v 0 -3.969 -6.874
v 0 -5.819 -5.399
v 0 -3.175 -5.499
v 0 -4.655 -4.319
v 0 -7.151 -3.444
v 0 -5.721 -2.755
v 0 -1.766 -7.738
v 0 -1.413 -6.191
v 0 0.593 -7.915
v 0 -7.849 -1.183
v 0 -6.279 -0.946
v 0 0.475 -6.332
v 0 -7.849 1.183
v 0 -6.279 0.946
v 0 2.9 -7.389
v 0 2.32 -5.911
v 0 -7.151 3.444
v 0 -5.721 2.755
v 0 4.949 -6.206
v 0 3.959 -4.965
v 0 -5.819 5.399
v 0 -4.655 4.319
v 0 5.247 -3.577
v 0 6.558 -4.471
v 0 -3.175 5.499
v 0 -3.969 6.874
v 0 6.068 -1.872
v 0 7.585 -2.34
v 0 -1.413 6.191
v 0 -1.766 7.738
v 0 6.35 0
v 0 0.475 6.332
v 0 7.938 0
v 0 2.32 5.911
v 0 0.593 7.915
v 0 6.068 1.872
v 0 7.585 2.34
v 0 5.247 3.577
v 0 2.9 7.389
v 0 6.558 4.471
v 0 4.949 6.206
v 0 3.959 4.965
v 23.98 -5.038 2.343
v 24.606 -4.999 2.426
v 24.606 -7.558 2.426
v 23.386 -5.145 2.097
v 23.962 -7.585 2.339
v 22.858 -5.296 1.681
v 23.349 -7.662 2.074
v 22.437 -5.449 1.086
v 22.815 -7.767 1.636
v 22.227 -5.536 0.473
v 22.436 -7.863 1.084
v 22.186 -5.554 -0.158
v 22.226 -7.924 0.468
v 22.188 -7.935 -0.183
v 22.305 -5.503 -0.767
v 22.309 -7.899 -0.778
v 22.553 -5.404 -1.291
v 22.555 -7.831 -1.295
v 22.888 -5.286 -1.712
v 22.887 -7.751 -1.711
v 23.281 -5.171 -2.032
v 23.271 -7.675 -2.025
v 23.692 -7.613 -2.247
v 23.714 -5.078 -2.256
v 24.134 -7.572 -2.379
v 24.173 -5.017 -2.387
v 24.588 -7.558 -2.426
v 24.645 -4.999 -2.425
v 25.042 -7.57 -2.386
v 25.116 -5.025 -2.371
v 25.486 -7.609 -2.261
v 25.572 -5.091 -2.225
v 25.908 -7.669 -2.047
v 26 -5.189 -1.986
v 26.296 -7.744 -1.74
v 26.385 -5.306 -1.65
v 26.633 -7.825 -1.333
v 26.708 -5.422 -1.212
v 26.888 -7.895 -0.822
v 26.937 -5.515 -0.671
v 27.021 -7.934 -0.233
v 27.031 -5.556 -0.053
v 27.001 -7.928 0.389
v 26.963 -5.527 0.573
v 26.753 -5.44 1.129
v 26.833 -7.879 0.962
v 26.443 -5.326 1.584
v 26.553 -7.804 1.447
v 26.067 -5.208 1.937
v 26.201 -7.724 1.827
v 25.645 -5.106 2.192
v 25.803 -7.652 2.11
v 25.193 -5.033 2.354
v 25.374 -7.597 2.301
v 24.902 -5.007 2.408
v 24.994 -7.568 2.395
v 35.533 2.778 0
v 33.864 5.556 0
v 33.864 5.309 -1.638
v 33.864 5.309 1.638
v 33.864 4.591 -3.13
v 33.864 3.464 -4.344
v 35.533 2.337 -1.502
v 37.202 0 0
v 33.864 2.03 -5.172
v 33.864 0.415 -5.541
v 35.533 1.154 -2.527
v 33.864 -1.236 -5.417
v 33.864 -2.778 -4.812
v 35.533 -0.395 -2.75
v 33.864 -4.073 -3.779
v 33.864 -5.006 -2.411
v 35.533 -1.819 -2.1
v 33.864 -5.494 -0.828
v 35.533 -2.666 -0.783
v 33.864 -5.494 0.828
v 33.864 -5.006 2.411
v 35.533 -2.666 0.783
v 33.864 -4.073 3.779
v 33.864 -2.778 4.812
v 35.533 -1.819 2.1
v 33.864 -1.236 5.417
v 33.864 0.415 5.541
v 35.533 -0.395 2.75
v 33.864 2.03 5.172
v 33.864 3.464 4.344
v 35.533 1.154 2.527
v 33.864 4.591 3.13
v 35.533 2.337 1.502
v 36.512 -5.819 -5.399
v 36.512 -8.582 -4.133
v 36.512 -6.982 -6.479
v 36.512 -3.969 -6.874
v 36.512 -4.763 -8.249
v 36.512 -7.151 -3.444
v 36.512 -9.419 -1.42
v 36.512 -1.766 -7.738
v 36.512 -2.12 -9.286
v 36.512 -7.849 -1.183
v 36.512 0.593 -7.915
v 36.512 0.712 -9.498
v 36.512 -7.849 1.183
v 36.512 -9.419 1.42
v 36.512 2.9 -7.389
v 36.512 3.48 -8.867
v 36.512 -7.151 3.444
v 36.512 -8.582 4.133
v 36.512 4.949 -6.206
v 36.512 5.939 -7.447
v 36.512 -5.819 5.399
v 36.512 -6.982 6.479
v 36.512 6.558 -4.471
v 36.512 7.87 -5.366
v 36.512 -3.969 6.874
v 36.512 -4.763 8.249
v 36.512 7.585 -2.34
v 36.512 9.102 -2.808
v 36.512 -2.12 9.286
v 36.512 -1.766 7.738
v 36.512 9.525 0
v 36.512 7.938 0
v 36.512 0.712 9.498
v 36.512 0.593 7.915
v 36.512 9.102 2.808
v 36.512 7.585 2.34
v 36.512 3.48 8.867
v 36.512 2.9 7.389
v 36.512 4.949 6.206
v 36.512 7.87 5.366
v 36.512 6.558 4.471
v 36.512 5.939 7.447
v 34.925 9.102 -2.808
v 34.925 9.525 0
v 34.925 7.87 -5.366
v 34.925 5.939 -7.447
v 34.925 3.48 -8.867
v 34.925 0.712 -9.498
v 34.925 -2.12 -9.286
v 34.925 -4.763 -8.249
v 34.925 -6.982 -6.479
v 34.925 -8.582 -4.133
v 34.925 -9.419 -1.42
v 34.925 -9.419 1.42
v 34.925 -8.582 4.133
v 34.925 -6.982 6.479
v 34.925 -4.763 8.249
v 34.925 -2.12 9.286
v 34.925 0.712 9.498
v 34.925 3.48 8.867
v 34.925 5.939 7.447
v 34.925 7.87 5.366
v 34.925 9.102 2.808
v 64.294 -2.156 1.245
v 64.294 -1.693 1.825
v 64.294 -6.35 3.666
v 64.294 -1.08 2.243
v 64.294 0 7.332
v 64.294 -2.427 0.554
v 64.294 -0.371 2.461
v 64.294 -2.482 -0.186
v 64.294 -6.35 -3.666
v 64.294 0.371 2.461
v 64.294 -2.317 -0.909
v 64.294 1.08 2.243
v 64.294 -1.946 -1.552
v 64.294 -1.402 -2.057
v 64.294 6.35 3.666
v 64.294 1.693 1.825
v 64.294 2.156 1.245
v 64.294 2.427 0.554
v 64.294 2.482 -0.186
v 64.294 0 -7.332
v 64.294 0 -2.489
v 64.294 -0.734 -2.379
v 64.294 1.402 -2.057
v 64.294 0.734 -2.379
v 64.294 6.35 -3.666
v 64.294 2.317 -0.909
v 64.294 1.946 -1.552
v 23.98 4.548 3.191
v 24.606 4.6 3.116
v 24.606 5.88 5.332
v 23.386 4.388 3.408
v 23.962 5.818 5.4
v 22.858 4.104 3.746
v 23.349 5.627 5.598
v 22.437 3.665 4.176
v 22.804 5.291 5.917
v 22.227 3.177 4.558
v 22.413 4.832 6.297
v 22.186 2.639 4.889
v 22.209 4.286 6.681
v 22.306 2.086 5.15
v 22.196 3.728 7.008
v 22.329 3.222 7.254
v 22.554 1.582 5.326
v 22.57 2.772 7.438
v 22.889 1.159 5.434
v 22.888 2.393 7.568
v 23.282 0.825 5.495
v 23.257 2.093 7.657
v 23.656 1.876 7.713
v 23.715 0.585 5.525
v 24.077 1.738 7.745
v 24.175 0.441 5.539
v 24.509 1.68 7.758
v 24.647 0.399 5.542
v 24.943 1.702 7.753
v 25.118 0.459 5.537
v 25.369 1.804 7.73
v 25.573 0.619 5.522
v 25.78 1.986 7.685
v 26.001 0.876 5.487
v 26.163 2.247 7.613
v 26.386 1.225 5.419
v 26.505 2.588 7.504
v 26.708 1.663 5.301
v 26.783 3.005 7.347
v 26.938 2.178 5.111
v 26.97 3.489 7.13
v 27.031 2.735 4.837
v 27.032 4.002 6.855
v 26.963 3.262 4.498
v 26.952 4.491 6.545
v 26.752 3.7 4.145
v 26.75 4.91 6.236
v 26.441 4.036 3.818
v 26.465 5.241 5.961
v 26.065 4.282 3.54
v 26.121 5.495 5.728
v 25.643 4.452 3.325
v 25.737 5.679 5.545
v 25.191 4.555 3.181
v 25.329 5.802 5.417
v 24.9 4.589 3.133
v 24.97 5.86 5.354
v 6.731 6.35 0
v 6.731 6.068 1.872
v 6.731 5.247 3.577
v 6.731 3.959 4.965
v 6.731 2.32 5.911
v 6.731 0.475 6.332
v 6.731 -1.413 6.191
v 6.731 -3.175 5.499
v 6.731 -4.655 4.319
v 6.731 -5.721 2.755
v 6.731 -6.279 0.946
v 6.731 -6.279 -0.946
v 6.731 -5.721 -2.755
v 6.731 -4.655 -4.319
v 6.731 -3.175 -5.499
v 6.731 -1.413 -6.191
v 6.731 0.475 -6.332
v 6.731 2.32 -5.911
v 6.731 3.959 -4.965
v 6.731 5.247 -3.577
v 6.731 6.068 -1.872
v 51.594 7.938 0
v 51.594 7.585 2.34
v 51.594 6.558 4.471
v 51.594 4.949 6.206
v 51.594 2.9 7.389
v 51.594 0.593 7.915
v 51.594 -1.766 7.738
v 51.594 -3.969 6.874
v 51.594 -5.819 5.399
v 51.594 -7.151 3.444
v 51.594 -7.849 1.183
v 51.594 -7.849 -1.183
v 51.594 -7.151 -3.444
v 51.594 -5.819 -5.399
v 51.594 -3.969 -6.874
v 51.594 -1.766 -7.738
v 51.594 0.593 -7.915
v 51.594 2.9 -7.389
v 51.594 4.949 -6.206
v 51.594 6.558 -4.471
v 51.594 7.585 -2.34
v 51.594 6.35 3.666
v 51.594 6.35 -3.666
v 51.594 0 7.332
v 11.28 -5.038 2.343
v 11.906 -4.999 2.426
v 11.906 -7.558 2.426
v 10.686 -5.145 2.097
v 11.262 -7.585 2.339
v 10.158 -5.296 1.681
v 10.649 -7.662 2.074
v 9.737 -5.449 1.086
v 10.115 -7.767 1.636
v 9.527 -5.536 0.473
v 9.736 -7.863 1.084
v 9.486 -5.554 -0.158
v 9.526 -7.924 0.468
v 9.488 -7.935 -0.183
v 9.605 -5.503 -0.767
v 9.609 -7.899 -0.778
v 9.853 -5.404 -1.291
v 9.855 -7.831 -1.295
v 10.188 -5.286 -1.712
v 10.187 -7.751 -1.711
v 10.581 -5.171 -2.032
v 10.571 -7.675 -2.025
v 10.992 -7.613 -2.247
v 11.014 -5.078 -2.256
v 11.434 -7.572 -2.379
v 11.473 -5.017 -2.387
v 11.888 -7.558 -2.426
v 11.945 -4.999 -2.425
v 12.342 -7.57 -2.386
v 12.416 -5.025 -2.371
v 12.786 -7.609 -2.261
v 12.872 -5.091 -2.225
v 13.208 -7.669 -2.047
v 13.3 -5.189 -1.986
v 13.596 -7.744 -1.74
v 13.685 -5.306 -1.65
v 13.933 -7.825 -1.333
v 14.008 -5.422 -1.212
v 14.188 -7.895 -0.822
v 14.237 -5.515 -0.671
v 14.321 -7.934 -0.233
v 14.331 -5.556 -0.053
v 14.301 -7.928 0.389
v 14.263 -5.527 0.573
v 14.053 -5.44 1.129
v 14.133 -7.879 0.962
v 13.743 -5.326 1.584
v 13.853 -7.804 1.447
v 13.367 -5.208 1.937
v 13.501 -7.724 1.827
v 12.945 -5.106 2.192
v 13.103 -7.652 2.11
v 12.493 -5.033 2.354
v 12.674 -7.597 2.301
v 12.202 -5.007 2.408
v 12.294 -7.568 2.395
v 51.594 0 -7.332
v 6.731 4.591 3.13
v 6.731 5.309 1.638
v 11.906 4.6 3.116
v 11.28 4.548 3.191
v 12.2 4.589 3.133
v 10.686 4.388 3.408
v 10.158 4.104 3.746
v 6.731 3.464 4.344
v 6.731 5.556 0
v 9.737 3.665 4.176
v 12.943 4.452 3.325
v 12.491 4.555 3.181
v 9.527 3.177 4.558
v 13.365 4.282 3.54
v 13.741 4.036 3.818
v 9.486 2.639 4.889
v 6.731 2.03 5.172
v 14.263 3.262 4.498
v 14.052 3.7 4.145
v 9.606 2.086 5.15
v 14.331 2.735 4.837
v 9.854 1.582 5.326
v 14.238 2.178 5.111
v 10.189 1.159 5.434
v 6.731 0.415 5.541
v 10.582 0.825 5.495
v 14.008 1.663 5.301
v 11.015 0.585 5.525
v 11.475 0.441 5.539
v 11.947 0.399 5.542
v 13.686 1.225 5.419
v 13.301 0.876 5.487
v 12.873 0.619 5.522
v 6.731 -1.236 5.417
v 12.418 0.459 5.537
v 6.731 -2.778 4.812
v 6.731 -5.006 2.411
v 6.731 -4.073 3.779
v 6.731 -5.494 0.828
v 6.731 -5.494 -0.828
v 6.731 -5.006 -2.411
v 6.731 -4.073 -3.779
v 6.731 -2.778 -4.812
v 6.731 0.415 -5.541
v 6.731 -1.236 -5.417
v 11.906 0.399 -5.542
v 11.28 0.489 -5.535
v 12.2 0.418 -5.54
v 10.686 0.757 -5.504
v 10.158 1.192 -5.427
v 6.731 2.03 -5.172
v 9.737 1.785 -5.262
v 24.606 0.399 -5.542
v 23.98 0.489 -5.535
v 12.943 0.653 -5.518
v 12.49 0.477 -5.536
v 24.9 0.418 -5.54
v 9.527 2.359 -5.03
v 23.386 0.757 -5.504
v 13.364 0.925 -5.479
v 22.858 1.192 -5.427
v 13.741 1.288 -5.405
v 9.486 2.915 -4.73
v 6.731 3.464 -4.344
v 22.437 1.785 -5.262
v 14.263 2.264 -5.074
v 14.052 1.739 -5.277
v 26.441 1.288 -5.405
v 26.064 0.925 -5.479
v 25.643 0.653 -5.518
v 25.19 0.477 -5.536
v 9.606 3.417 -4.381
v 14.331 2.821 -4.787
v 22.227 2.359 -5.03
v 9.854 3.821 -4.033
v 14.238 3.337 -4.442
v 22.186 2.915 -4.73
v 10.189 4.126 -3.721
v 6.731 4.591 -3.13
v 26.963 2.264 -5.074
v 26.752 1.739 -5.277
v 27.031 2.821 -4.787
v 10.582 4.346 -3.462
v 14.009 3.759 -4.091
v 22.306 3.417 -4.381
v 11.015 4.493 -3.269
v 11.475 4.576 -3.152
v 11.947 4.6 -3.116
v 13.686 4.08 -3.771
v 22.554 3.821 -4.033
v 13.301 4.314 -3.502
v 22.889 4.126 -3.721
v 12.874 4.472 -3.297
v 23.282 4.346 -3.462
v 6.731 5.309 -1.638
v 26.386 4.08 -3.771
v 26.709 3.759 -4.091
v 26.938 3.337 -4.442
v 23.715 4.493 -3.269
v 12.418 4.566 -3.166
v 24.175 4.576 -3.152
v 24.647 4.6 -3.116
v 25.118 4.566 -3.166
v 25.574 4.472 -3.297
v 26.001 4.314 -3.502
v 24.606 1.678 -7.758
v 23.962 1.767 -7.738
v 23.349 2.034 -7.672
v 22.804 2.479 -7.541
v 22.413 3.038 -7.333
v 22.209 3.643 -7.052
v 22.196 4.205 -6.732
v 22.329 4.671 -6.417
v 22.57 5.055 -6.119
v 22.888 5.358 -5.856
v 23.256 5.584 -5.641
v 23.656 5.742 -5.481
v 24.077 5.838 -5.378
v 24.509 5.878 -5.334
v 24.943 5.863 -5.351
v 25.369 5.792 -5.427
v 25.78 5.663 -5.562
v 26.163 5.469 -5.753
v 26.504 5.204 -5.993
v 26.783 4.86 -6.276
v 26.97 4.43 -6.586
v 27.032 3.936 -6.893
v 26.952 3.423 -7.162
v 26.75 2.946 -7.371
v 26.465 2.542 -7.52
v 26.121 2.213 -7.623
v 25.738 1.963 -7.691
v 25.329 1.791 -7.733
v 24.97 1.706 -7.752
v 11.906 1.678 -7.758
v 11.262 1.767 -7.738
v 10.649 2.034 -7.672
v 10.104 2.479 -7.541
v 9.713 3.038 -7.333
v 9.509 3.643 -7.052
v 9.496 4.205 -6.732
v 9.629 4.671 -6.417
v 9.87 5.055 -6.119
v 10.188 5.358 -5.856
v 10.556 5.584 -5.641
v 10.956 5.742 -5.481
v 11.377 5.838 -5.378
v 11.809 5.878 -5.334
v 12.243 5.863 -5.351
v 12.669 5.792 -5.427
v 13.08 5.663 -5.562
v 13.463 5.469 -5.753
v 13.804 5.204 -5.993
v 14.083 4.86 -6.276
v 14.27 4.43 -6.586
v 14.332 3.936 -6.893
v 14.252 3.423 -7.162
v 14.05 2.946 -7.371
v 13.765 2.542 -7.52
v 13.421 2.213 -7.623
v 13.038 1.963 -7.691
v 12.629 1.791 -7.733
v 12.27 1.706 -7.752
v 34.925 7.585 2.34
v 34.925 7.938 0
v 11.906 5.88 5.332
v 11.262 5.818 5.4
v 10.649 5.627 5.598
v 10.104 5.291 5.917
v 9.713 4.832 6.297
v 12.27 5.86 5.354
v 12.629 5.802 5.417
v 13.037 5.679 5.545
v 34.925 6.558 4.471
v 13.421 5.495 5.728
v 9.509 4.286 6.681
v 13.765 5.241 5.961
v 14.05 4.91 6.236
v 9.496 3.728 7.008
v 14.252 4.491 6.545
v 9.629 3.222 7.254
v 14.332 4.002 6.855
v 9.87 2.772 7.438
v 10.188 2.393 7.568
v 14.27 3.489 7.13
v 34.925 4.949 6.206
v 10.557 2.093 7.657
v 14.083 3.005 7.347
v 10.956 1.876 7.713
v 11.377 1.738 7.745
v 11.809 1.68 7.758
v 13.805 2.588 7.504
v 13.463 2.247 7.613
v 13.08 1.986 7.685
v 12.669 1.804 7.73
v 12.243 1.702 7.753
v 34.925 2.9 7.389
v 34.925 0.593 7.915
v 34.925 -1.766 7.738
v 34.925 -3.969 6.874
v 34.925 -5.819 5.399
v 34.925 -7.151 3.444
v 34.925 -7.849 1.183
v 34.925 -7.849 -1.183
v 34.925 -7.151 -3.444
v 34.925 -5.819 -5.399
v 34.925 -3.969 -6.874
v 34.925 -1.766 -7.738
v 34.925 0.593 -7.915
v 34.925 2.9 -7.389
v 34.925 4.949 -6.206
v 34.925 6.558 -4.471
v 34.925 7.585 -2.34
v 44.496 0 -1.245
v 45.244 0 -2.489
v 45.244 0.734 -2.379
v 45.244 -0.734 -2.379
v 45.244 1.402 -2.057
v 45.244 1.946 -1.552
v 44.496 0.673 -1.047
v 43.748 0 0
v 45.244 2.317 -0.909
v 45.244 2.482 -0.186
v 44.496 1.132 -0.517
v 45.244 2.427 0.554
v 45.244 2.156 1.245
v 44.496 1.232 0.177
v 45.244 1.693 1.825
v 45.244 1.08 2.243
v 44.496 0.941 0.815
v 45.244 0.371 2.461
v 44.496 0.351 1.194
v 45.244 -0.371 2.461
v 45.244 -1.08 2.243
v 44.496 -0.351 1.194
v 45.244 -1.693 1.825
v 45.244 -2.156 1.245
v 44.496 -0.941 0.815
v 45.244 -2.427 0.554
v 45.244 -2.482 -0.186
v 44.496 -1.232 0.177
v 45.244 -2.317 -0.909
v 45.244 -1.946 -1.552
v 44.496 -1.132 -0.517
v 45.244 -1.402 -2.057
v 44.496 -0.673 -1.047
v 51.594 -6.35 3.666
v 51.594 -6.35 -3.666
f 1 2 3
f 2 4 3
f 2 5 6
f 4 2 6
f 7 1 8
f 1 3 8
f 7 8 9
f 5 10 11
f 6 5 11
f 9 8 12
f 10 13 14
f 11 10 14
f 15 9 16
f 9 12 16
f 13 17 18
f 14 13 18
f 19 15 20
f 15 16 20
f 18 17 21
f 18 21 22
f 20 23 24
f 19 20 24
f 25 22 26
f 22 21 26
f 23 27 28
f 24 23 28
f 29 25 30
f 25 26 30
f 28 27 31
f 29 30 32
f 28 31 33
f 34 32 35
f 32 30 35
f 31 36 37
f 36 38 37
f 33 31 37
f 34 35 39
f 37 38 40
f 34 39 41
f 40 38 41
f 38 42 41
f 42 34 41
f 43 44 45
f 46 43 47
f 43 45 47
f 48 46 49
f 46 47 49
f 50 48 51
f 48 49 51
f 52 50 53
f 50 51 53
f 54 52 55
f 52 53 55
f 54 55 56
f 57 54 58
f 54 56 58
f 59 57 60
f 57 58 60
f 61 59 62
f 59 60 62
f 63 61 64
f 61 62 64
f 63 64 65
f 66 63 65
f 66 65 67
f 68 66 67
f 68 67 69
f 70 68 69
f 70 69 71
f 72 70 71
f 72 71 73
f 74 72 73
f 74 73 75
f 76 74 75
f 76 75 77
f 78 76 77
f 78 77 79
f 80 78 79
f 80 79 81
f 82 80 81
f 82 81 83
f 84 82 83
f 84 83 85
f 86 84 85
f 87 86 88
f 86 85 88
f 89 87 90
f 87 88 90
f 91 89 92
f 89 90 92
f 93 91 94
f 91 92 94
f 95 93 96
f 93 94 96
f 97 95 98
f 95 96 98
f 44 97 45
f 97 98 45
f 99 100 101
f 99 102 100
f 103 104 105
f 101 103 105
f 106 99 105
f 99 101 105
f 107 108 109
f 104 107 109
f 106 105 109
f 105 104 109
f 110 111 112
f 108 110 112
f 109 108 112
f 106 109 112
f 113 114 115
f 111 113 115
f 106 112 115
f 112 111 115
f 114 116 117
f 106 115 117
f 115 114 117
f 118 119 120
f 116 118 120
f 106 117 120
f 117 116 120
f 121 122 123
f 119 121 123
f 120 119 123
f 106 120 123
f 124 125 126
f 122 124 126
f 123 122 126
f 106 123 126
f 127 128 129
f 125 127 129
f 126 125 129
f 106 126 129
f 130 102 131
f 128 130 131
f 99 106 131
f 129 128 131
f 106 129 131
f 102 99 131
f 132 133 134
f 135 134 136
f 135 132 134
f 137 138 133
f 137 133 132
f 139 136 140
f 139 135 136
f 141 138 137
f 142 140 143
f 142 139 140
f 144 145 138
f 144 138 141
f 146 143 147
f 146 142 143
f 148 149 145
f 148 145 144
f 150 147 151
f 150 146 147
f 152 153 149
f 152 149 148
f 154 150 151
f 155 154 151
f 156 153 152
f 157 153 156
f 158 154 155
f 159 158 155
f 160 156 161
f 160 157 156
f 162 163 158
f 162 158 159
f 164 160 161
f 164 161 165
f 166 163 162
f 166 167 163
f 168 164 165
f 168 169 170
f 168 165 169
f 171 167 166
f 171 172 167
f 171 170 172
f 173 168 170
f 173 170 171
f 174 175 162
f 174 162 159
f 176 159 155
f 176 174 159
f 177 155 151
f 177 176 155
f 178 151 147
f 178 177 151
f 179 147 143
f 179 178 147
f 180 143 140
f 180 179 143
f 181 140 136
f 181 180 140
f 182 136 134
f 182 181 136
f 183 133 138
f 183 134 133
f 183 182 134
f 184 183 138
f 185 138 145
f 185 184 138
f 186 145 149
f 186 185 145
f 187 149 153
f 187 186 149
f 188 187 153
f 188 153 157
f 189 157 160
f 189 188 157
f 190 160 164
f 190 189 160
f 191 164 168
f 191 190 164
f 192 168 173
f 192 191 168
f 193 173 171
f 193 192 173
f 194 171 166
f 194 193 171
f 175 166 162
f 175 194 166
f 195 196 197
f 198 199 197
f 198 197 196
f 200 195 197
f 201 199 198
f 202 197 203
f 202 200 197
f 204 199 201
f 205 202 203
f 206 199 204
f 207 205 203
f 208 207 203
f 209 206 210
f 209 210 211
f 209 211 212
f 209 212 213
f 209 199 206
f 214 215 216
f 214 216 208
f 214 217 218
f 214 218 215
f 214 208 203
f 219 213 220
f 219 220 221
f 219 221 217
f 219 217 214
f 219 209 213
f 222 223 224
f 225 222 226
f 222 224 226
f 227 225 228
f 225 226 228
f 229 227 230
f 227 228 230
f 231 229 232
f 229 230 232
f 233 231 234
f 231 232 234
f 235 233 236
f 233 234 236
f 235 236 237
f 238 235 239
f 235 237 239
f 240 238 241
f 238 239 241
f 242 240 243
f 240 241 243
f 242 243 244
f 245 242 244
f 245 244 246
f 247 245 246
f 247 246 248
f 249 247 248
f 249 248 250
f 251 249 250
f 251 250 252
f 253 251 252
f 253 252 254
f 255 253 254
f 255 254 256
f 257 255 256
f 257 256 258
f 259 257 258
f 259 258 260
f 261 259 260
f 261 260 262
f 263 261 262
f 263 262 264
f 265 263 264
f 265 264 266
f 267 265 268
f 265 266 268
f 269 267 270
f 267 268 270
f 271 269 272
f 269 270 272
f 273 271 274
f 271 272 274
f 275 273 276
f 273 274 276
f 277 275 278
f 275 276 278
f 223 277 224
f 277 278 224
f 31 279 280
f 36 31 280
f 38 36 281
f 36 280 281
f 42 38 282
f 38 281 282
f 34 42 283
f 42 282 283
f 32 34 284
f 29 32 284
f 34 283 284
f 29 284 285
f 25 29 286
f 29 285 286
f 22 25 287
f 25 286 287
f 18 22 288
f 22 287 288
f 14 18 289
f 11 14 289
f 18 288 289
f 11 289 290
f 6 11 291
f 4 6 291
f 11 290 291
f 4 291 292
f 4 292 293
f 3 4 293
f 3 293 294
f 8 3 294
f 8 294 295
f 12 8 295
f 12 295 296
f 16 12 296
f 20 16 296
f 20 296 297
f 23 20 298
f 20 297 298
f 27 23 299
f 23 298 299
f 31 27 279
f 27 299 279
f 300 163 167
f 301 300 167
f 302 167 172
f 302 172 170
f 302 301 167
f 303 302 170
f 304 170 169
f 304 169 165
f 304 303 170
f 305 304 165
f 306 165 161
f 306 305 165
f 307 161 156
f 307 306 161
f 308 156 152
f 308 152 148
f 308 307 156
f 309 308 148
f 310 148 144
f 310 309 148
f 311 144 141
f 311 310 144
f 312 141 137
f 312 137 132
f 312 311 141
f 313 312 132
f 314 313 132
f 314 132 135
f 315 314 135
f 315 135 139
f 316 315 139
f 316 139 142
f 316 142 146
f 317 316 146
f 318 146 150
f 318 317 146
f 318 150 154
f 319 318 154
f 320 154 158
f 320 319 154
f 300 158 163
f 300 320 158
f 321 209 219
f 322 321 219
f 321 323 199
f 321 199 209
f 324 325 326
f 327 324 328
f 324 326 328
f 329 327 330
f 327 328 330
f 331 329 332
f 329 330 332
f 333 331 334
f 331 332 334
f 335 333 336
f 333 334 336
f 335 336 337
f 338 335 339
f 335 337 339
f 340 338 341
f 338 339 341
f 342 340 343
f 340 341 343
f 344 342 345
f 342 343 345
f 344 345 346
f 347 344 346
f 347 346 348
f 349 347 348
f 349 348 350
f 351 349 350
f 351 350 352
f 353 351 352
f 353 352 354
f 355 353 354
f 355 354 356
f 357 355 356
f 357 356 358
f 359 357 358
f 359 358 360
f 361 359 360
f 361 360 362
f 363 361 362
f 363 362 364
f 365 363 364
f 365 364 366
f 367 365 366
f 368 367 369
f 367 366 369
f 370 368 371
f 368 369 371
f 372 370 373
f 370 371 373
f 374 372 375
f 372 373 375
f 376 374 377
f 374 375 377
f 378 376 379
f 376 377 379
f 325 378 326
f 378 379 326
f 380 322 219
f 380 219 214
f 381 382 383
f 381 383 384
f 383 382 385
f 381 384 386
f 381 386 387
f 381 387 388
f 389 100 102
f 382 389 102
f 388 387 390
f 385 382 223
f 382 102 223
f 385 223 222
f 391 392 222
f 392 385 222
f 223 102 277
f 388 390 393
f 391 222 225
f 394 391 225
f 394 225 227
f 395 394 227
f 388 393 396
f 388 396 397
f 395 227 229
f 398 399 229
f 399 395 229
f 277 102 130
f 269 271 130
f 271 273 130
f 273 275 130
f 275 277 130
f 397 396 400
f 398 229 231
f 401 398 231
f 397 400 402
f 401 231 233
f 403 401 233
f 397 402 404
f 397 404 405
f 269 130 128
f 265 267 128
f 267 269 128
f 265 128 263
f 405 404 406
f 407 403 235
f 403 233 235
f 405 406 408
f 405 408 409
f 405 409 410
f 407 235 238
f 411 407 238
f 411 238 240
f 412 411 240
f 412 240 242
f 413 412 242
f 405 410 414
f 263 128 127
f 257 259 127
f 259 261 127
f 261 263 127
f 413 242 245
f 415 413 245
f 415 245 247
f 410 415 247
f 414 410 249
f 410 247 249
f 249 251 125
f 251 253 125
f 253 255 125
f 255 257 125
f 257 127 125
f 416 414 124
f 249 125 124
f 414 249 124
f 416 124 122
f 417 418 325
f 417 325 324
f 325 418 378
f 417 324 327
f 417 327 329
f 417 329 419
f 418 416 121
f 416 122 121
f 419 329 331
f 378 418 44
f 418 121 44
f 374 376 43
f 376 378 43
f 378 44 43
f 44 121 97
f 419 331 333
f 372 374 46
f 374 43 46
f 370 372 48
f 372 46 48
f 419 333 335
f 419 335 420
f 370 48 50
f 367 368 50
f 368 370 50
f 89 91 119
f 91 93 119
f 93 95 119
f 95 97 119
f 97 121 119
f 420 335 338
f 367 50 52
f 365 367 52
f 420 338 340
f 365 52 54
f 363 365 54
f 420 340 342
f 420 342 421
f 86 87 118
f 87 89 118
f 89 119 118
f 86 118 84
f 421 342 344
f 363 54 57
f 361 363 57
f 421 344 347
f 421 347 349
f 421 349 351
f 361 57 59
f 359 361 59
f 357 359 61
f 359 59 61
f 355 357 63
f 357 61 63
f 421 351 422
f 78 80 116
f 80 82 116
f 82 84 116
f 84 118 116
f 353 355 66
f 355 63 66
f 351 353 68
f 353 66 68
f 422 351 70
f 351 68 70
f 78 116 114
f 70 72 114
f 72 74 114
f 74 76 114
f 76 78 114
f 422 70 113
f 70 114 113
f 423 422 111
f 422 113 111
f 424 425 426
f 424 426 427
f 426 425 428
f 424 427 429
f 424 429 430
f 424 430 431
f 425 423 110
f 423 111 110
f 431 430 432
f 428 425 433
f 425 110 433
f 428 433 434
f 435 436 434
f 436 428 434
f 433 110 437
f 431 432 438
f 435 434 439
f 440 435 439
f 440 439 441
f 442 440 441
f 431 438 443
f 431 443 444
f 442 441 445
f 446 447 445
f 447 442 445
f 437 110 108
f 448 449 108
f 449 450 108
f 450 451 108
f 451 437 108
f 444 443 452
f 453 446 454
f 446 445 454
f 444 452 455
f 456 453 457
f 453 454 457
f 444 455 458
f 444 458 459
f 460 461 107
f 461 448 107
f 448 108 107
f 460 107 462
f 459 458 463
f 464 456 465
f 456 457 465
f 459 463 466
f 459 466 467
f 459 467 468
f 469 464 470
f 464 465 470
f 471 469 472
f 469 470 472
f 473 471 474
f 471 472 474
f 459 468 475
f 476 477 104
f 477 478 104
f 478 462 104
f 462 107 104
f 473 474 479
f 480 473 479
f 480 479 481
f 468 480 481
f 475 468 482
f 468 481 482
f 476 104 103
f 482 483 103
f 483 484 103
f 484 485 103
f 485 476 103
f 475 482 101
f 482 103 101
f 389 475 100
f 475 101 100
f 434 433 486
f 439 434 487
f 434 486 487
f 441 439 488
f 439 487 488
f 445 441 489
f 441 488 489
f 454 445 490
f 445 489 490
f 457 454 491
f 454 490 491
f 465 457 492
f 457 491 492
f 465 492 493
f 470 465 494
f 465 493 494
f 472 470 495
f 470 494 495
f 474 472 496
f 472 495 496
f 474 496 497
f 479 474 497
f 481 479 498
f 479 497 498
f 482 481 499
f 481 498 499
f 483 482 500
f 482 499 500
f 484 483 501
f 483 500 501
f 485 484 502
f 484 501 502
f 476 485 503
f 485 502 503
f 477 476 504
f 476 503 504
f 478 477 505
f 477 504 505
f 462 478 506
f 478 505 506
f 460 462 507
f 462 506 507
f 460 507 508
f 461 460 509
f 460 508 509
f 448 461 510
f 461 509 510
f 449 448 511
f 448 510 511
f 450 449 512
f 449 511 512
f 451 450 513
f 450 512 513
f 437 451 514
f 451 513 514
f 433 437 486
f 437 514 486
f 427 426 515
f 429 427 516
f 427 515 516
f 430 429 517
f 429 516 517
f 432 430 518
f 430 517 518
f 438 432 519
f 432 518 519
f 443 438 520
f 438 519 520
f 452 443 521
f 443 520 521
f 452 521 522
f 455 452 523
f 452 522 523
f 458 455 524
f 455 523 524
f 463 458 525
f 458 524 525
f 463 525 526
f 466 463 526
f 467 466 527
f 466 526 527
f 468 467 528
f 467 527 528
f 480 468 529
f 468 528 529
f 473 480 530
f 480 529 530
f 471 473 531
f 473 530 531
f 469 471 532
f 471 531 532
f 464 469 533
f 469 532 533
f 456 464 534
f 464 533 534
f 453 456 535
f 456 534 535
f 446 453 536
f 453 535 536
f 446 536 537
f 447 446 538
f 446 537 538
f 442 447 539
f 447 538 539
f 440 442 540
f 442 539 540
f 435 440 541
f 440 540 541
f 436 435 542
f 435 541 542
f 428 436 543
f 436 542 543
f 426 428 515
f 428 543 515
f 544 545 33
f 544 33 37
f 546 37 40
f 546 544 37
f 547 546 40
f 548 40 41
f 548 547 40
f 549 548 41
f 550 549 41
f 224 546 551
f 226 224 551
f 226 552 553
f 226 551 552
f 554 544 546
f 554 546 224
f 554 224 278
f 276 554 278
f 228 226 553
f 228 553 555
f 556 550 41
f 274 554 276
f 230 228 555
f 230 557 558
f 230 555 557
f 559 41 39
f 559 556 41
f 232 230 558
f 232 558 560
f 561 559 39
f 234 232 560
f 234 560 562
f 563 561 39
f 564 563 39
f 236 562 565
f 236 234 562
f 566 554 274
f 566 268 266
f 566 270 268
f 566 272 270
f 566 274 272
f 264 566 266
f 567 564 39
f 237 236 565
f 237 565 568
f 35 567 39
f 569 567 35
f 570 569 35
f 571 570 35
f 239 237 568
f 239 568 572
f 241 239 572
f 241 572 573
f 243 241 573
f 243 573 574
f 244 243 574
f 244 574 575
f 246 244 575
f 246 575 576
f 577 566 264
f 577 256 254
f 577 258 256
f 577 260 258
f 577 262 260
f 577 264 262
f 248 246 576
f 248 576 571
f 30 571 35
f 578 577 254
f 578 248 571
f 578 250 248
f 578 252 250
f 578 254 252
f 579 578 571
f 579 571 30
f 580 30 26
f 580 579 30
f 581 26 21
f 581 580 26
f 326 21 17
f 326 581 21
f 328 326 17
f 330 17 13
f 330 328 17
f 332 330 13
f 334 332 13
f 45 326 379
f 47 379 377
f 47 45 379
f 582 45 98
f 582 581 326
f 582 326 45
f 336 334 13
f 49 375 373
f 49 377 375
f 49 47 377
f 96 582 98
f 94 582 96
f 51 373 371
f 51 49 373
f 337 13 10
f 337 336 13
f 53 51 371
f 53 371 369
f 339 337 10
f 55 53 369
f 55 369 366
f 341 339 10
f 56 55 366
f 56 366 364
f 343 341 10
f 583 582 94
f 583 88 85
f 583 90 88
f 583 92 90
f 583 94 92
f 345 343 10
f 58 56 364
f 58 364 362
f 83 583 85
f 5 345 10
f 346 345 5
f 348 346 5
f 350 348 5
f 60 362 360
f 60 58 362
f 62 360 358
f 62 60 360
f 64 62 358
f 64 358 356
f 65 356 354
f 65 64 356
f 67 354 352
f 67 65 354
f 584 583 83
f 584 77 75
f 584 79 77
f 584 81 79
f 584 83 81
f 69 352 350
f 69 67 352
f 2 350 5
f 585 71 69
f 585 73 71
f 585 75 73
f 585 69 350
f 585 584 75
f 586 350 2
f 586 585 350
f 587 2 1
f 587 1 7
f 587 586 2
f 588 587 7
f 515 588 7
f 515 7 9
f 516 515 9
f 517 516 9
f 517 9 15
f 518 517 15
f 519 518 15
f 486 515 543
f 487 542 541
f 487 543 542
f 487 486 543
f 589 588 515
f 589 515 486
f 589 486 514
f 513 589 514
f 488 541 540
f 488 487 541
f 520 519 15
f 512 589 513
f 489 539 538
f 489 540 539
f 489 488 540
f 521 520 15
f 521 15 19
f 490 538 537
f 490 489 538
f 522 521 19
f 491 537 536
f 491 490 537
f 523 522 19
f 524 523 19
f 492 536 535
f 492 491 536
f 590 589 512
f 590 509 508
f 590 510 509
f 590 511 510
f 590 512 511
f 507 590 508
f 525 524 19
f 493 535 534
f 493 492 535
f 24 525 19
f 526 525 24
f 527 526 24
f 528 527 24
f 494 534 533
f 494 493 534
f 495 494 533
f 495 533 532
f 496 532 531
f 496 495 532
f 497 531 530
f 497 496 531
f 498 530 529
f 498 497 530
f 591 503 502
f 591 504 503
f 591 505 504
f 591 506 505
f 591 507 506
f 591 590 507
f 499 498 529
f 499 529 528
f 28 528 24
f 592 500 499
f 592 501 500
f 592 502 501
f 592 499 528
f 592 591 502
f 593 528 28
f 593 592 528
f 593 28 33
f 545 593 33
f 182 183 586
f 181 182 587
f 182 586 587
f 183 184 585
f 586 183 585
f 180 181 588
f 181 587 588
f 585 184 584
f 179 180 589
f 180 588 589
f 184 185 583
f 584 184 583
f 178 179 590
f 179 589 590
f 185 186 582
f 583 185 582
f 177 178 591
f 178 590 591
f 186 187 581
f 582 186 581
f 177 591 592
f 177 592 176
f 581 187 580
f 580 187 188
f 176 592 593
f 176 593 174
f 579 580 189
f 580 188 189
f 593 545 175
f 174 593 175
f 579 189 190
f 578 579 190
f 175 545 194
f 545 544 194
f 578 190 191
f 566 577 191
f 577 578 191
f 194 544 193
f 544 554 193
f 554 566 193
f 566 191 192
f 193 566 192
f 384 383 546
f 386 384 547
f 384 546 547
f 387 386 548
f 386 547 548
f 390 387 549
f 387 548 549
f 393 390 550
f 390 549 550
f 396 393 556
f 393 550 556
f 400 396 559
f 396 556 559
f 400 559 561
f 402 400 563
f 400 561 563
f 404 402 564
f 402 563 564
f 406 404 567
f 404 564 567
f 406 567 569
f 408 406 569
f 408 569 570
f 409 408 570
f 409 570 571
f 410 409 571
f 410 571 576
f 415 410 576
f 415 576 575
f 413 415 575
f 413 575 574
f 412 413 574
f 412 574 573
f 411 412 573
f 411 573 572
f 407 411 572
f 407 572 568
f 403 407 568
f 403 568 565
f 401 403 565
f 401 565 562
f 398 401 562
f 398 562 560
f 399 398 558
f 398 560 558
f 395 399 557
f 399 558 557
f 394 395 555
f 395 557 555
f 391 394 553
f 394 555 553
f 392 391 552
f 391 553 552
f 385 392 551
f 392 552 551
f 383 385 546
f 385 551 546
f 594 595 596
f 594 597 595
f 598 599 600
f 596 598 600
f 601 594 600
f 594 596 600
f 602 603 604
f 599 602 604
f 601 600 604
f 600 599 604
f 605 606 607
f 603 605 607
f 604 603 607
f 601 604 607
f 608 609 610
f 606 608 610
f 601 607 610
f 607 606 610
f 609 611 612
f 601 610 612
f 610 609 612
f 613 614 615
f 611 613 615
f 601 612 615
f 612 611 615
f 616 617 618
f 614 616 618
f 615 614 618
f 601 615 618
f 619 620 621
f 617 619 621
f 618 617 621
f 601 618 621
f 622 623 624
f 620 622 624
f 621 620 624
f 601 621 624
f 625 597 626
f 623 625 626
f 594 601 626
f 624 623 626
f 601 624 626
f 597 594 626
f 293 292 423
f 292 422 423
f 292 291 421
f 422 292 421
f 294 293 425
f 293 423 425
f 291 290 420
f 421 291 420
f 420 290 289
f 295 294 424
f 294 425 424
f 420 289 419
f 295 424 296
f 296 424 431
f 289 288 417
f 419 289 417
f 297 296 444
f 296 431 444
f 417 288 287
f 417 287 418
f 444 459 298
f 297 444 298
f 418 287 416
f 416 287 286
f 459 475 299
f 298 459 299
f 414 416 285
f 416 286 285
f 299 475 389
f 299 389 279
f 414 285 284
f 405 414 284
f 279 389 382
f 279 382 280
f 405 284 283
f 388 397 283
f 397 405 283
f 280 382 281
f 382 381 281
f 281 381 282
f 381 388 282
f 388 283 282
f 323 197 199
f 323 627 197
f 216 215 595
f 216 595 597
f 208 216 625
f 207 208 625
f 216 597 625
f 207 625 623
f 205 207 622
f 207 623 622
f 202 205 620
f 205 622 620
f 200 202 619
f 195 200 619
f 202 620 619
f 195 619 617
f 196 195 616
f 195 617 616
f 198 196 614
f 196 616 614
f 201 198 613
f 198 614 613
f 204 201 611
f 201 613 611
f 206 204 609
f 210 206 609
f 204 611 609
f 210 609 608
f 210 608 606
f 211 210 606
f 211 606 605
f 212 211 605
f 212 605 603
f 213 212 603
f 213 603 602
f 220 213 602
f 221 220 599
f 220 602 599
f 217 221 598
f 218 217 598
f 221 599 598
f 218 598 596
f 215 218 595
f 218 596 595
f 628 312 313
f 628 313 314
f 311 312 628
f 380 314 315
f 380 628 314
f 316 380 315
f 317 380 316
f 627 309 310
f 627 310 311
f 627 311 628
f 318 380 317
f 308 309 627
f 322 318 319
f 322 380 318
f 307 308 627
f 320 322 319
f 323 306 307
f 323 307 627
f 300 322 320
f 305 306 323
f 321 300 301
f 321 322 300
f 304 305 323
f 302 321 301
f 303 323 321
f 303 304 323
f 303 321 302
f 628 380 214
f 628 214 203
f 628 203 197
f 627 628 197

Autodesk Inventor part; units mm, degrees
ref_plane "YZ Plane" through (0, 0, 0) normal (1, 0, 0) x (0, 1, 0)
ref_plane "XZ Plane" through (0, 0, 0) normal (0, 1, 0) x (-1, 0, 0)
ref_plane "XY Plane" through (0, 0, 0) normal (0, 0, 1) x (1, 0, 0)
sketch "Sketch1" plane through (0, 0, 0) normal (0, 0, 1) x (1, 0, 0)
  line L0 (0, 0) -> (8.7313, 0) construction
  line L1 (0, 0) -> (0, 6.35) construction
  line L2 (0, 7.9375) -> (8.7312, 7.9375)
  line L3 (8.7312, 7.9375) -> (8.7313, 0) construction
  line L4 (8.7312, 7.9375) -> (34.925, 7.9375)
  line L5 (8.7312, 7.9375) -> (8.7312, 14.2875) construction
  line L6 (8.7312, 14.2875) -> (9.525, 14.2875) construction
  line L7 (9.525, 14.2875) -> (9.525, 0) construction
  line L8 (9.525, 0) -> (8.7313, 0) construction
  line L9 (9.525, 0) -> (19.05, 0) construction
  line L10 (19.05, 0) -> (19.05, 26.67) construction
  line L11 (19.05, 26.67) -> (9.525, 26.67) construction
  line L12 (9.525, 26.67) -> (9.525, 14.2875) construction
  line L13 (14.2875, 0) -> (14.2875, 26.67) construction
  line L14 (14.2875, 17.4625) -> (21.4312, 17.4625) construction
  line L15 (21.4312, 17.4625) -> (21.4313, 0) construction
  line L16 (21.4313, 0) -> (19.05, 0) construction
  line L17 (21.4313, 0) -> (22.225, 0) construction
  line L18 (22.225, 0) -> (22.225, 14.2875) construction
  line L19 (22.225, 14.2875) -> (21.4313, 14.2875) construction
  line L20 (21.4313, 14.2875) -> (21.4313, 0) construction
  line L21 (22.225, 0) -> (31.75, 0) construction
  line L22 (31.75, 0) -> (31.75, 20.32) construction
  line L23 (31.75, 20.32) -> (22.225, 20.32) construction
  line L24 (22.225, 20.32) -> (22.225, 0) construction
  line L25 (26.9875, 20.32) -> (26.9875, 0) construction
  line L26 (26.9875, 17.4625) -> (34.1313, 17.4625) construction
  line L27 (34.1313, 17.4625) -> (34.1313, 0) construction
  line L28 (34.1313, 0) -> (31.75, 0) construction
  line L29 (34.1313, 0) -> (34.925, 0) construction
  line L30 (34.925, 0) -> (34.925, 14.2875) construction
  line L31 (34.925, 14.2875) -> (34.1313, 14.2875) construction
  line L32 (34.1313, 14.2875) -> (34.1313, 0) construction
  line L33 (34.925, 0) -> (36.5125, 0) construction
  line L34 (36.5125, 0) -> (36.5125, 7.9375) construction
  line L35 (36.5125, 9.525) -> (34.925, 9.525)
  line L36 (34.925, 9.525) -> (34.925, 7.9375)
  line L37 (45.2438, 7.9375) -> (45.2438, 0) construction
  line L38 (45.2438, 0) -> (36.5125, 0)
  line L39 (11.9063, 26.67) -> (11.9063, 0) construction
  line L40 (24.6063, 20.32) -> (24.6063, 0) construction
  line L41 (0, 7.9375) -> (0, 17.4625) construction
  line L42 (0, 17.4625) -> (8.7312, 17.4625) construction
  line L43 (8.7312, 17.4625) -> (8.7312, 14.2875) construction
  line L44 (0, 3.175) -> (45.2438, 3.175) construction
  circle A0 centre (11.9063, 5.5562) radius 2.3813 construction
  circle A1 centre (24.6063, 5.5562) radius 2.3812 construction
  circle A2 centre (11.9063, 5.8103) radius 2.3813 construction
  circle A3 centre (11.9063, 7.5565) radius 2.3813 construction
  circle A4 centre (24.6063, 5.8103) radius 2.3812 construction
  circle A5 centre (24.6063, 7.5565) radius 2.3812 construction
  line L45 (9.525, 8.1915) -> (14.2875, 8.1915) construction
  line L46 (12.6386, 3.175) -> (14.6388, 5.1753) construction
  line L47 (14.6388, 5.1753) -> (21.8737, 5.1753) construction
  line L48 (21.8737, 5.1753) -> (23.8739, 3.175) construction
  line L49 (22.225, 8.1915) -> (26.9875, 8.1915) construction
  line L50 (10.3187, 5.1753) -> (17.4901, 5.1753) construction
  line L51 (26.1938, 5.1753) -> (19.0224, 5.1753) construction
  line L52 (0, 6.35) -> (6.731, 6.35)
  line L53 (6.731, 6.35) -> (6.731, 5.5562)
  line L54 (10.3187, 5.1753) -> (8.3185, 3.175) construction
  line L55 (17.4901, 5.1753) -> (19.4903, 3.175) construction
  line L56 (19.4903, 3.175) -> (26.1938, 3.175) construction
  line L57 (26.1938, 3.175) -> (28.1015, 0) construction
  line L58 (26.1938, 5.1753) -> (28.194, 3.175) construction
  line L59 (28.194, 3.175) -> (34.8974, 3.175) construction
  line L60 (34.8974, 3.175) -> (36.8052, 0) construction
  line L61 (6.731, 5.5562) -> (33.8635, 5.5563)
  line L62 (37.202, 0) -> (33.8635, 5.5563)
  line L63 (19.0224, 5.1753) -> (17.0222, 3.175) construction
  line L64 (17.0222, 3.175) -> (-3.175, 3.175) construction
  line L65 (45.2438, 7.9375) -> (45.2438, 17.4625) construction
  line L66 (45.2438, 17.4625) -> (36.5125, 17.4625) construction
  line L67 (36.5125, 17.4625) -> (36.5125, 9.525) construction
  line L68 (45.2438, 7.9375) -> (51.5938, 7.9375)
  line L69 (51.5938, 7.9375) -> (51.5938, 0)
  line L70 (51.5938, 0) -> (45.2438, 0)
  line L71 (51.5938, 6.35) -> (64.2938, 6.35) construction
  line L72 (64.2938, 6.35) -> (64.2938, 0) construction
  line L73 (64.2938, 0) -> (51.5938, 0) construction
  line L74 (-8.1534, 3.175) -> (-8.1534, 2.3812) construction
  line L75 (-8.1534, 0) -> (36.8052, 0) construction
  line L76 (-3.175, 3.175) -> (-3.175, 2.3812) construction
  line L77 (-3.175, 2.3812) -> (-8.1534, 2.3812) construction
  line L78 (-8.1534, 3.175) -> (-8.1534, 6.35) construction
  line L79 (-8.1534, 6.35) -> (-3.175, 6.35) construction
  line L80 (-3.175, 6.35) -> (-3.175, 3.175) construction
  line L81 (-3.175, 0) -> (-3.175, 2.3812) construction
  line L82 (-0.7937, 0) -> (-0.7938, 11.1125) construction
  line L83 (-0.7938, 11.1125) -> (-3.175, 11.1125) construction
  line L84 (-3.175, 11.1125) -> (-3.175, 6.35) construction
  line L85 (-3.175, 3.175) -> (-8.1534, 3.175) construction
  line L86 (-8.1534, 2.3812) -> (-8.1534, 0) construction
  line L87 (-8.1534, 2.7051) -> (-9.652, 2.7051) construction
  line L88 (-9.652, 2.7051) -> (-9.652, 0) construction
  line L89 (-9.652, 0) -> (-8.1534, 0) construction
  line L90 (-8.1534, 1.4224) -> (-5.6134, 1.4224) construction
  line L91 (-5.6134, 1.4224) -> (-5.6134, 0) construction
  line L92 (-5.6134, 1.4224) -> (-3.0734, 1.4224) construction
  line L93 (-3.0734, 1.4224) -> (-3.0734, 0) construction
  line L94 (-3.175, 11.1125) -> (-13.4938, 11.1125) construction
  line L95 (-13.4938, 11.1125) -> (-13.4937, 5.9531) construction
  line L96 (-13.4937, 5.9531) -> (-18.5801, 5.9531) construction
  line L97 (-18.5801, 5.9531) -> (-18.5801, 0) construction
  line L98 (-18.5801, 0) -> (-9.652, 0) construction
  line L99 (-8.1534, 3.9687) -> (-14.6113, 3.9687) construction
  line L100 (-14.6113, 3.9687) -> (-14.6113, 0) construction
  line L101 (-14.6113, 3.429) -> (-10.4457, 3.429) construction
  line L102 (-10.4457, 3.429) -> (-10.4457, 0) construction
  line L103 (-16.9926, 3.175) -> (-16.9926, 0) construction
  line L104 (-16.9926, 3.175) -> (-18.5801, 3.175) construction
  line L105 (0, 6.35) -> (0, 7.9375)
  line L106 (6.731, 5.5562) -> (6.731, 0) construction
  line L107 (33.8635, 5.5563) -> (45.2438, 5.5563) construction
  line L108 (34.925, 7.9375) -> (34.925, 0) construction
  line L109 (36.5125, 7.9375) -> (36.5125, 9.525)
  line L110 (36.5125, 7.9375) -> (45.2438, 7.9375)
  line L111 (34.925, 7.9375) -> (36.5125, 7.9375) construction
  dimension "d1" = 7.9375
  dimension "d2" = 0.7937
  dimension "d3" = 14.2875
  dimension "d4" = 9.525
  dimension "d5" = 26.67
  dimension "d6" = 7.1437
  dimension "d7" = 17.4625
  dimension "d8" = 0.7937
  dimension "d9" = 14.2875
  dimension "d10" = 9.525
  dimension "d11" = 20.32
  dimension "d12" = 7.1437
  dimension "d13" = 17.4625
  dimension "d14" = 0.7937
  dimension "d15" = 14.2875
  dimension "d16" = 1.5875
  dimension "d17" = 9.525
  dimension "d18" = 8.7312
  dimension "d19" = 2.3813
  dimension "d20" = 2.3813
  dimension "d21" = 17.4625
  dimension "d22" = 3.175
  dimension "d23" = 4.7625
  dimension "d24" = 4.7625
  dimension "d26" = 0.254
  dimension "d28" = 45
  dimension "d29" = 45
  dimension "d30" = 0.254
  dimension "d31" = 7.2348
  dimension "d32" = 5.1753
  dimension "d33" = 7.1713
  dimension "d34" = 1.5875
  dimension "d35" = 7.1713
  dimension "d36" = 1.5875
  dimension "d37" = 6.35
  dimension "d39" = 45
  dimension "d40" = 45
  dimension "d41" = 1.5875
  dimension "d42" = 59
  dimension "d43" = 6.7034
  dimension "d44" = 6.7034
  dimension "d46" = 0.3969
  dimension "d52" = 17.4625
  dimension "d53" = 6.35
  dimension "d54" = 12.7
  dimension "d55" = 6.35
  dimension "d56" = 2.3813
  dimension "d57" = 4.9784
  dimension "d58" = 6.35
  dimension "d66" = 2.3813
  dimension "d67" = 0.7937
  dimension "d68" = 11.1125
  dimension "d69" = 2.7051
  dimension "d70" = 1.4986
  dimension "d71" = 1.4224
  dimension "d72" = 2.54
  dimension "d73" = 2.54
  dimension "d74" = 3.9688
  dimension "d75" = 4.1656
  dimension "d76" = 3.429
  dimension "d77" = 0.7937
  dimension "d78" = 3.175
  dimension "d79" = 2.3813
  dimension "d80" = 1.5875
revolve "Revolution1" add sketch "Sketch1" angle 360 about axis through (9.525, 0, 0) along (1, 0, 0)
sketch "Sketch2" plane through (51.5938, 0, 0) normal (1, 0, 0) x (0, 0, -1)
  circle A0 centre (0, 0) radius 7.9375 projected
  line L0 (-7.3323, 0) -> (-3.6662, 6.35)
  line L1 (-3.6662, 6.35) -> (3.6662, 6.35)
  line L2 (3.6662, 6.35) -> (7.3323, 0)
  line L3 (7.3323, 0) -> (3.6662, -6.35)
  line L4 (3.6662, -6.35) -> (-3.6662, -6.35)
  line L5 (-3.6662, -6.35) -> (-7.3323, 0)
  dimension "d88" = 12.7
extrude "Extrusion1" add sketch "Sketch2" along normal blind 12.7 contours L0 L1 L2 L3 L4 L5
sketch "Sketch3" plane through (0, 0, 0) normal (0, 1, 0) x (-1, 0, 0)
  point P0 (0, 0)
  point P1 (-11.9063, 0)
  point P2 (-24.6063, 0)
hole "Hole1" at (11.9063, 0, 0) at (24.6063, 0, 0) direction (0, -1, 0) diameter 4.8514 end through all
pattern_circular "Circular Pattern1" count 3 over 360 about axis through (-10, 0, 0) along (1, 0, 0) of "Hole1"
ref_plane "Work Plane1" through (10.3187, 5.1753, 0) normal (-1, 0, 0) x (0, 0, 1)
ref_plane "Work Plane2" through (26.1938, 3.175, 0) normal (-1, 0, 0) x (0, 0, 1)
ref_plane "Work Plane3" through (17.4901, 5.1753, 0) normal (-1, 0, 0) x (0, 0, 1)
sketch "Sketch4" plane through (64.2938, 0, 0) normal (1, 0, 0) x (0, 0, -1)
  point P0 (0, 0)
  point P1 (0, 0)
hole "Hole2" at (64.2938, 0, 0) direction (-1, 0, 0) diameter 4.9784 depth 19.05 tip angle 118 thread size "1/4-20 UNC" class "2B" standard "ANSI Unified Screw Threads"
equation "\"d9\" = d3"
equation "\"d12\" = d6"
equation "\"d13\" = d7"
equation "\"d15\" = d9"
equation "\"d18\" = d0"
equation "\"d20\" = d19"
equation "\"d35\" = d33"
equation "\"d36\" = d34"
equation "\"d43\" = d44"
equation "\"d52\" = d13"
equation "\"d0\" = 8.73125"
properties part number "Ball Shifting Outline" material "Steel, Alloy"
